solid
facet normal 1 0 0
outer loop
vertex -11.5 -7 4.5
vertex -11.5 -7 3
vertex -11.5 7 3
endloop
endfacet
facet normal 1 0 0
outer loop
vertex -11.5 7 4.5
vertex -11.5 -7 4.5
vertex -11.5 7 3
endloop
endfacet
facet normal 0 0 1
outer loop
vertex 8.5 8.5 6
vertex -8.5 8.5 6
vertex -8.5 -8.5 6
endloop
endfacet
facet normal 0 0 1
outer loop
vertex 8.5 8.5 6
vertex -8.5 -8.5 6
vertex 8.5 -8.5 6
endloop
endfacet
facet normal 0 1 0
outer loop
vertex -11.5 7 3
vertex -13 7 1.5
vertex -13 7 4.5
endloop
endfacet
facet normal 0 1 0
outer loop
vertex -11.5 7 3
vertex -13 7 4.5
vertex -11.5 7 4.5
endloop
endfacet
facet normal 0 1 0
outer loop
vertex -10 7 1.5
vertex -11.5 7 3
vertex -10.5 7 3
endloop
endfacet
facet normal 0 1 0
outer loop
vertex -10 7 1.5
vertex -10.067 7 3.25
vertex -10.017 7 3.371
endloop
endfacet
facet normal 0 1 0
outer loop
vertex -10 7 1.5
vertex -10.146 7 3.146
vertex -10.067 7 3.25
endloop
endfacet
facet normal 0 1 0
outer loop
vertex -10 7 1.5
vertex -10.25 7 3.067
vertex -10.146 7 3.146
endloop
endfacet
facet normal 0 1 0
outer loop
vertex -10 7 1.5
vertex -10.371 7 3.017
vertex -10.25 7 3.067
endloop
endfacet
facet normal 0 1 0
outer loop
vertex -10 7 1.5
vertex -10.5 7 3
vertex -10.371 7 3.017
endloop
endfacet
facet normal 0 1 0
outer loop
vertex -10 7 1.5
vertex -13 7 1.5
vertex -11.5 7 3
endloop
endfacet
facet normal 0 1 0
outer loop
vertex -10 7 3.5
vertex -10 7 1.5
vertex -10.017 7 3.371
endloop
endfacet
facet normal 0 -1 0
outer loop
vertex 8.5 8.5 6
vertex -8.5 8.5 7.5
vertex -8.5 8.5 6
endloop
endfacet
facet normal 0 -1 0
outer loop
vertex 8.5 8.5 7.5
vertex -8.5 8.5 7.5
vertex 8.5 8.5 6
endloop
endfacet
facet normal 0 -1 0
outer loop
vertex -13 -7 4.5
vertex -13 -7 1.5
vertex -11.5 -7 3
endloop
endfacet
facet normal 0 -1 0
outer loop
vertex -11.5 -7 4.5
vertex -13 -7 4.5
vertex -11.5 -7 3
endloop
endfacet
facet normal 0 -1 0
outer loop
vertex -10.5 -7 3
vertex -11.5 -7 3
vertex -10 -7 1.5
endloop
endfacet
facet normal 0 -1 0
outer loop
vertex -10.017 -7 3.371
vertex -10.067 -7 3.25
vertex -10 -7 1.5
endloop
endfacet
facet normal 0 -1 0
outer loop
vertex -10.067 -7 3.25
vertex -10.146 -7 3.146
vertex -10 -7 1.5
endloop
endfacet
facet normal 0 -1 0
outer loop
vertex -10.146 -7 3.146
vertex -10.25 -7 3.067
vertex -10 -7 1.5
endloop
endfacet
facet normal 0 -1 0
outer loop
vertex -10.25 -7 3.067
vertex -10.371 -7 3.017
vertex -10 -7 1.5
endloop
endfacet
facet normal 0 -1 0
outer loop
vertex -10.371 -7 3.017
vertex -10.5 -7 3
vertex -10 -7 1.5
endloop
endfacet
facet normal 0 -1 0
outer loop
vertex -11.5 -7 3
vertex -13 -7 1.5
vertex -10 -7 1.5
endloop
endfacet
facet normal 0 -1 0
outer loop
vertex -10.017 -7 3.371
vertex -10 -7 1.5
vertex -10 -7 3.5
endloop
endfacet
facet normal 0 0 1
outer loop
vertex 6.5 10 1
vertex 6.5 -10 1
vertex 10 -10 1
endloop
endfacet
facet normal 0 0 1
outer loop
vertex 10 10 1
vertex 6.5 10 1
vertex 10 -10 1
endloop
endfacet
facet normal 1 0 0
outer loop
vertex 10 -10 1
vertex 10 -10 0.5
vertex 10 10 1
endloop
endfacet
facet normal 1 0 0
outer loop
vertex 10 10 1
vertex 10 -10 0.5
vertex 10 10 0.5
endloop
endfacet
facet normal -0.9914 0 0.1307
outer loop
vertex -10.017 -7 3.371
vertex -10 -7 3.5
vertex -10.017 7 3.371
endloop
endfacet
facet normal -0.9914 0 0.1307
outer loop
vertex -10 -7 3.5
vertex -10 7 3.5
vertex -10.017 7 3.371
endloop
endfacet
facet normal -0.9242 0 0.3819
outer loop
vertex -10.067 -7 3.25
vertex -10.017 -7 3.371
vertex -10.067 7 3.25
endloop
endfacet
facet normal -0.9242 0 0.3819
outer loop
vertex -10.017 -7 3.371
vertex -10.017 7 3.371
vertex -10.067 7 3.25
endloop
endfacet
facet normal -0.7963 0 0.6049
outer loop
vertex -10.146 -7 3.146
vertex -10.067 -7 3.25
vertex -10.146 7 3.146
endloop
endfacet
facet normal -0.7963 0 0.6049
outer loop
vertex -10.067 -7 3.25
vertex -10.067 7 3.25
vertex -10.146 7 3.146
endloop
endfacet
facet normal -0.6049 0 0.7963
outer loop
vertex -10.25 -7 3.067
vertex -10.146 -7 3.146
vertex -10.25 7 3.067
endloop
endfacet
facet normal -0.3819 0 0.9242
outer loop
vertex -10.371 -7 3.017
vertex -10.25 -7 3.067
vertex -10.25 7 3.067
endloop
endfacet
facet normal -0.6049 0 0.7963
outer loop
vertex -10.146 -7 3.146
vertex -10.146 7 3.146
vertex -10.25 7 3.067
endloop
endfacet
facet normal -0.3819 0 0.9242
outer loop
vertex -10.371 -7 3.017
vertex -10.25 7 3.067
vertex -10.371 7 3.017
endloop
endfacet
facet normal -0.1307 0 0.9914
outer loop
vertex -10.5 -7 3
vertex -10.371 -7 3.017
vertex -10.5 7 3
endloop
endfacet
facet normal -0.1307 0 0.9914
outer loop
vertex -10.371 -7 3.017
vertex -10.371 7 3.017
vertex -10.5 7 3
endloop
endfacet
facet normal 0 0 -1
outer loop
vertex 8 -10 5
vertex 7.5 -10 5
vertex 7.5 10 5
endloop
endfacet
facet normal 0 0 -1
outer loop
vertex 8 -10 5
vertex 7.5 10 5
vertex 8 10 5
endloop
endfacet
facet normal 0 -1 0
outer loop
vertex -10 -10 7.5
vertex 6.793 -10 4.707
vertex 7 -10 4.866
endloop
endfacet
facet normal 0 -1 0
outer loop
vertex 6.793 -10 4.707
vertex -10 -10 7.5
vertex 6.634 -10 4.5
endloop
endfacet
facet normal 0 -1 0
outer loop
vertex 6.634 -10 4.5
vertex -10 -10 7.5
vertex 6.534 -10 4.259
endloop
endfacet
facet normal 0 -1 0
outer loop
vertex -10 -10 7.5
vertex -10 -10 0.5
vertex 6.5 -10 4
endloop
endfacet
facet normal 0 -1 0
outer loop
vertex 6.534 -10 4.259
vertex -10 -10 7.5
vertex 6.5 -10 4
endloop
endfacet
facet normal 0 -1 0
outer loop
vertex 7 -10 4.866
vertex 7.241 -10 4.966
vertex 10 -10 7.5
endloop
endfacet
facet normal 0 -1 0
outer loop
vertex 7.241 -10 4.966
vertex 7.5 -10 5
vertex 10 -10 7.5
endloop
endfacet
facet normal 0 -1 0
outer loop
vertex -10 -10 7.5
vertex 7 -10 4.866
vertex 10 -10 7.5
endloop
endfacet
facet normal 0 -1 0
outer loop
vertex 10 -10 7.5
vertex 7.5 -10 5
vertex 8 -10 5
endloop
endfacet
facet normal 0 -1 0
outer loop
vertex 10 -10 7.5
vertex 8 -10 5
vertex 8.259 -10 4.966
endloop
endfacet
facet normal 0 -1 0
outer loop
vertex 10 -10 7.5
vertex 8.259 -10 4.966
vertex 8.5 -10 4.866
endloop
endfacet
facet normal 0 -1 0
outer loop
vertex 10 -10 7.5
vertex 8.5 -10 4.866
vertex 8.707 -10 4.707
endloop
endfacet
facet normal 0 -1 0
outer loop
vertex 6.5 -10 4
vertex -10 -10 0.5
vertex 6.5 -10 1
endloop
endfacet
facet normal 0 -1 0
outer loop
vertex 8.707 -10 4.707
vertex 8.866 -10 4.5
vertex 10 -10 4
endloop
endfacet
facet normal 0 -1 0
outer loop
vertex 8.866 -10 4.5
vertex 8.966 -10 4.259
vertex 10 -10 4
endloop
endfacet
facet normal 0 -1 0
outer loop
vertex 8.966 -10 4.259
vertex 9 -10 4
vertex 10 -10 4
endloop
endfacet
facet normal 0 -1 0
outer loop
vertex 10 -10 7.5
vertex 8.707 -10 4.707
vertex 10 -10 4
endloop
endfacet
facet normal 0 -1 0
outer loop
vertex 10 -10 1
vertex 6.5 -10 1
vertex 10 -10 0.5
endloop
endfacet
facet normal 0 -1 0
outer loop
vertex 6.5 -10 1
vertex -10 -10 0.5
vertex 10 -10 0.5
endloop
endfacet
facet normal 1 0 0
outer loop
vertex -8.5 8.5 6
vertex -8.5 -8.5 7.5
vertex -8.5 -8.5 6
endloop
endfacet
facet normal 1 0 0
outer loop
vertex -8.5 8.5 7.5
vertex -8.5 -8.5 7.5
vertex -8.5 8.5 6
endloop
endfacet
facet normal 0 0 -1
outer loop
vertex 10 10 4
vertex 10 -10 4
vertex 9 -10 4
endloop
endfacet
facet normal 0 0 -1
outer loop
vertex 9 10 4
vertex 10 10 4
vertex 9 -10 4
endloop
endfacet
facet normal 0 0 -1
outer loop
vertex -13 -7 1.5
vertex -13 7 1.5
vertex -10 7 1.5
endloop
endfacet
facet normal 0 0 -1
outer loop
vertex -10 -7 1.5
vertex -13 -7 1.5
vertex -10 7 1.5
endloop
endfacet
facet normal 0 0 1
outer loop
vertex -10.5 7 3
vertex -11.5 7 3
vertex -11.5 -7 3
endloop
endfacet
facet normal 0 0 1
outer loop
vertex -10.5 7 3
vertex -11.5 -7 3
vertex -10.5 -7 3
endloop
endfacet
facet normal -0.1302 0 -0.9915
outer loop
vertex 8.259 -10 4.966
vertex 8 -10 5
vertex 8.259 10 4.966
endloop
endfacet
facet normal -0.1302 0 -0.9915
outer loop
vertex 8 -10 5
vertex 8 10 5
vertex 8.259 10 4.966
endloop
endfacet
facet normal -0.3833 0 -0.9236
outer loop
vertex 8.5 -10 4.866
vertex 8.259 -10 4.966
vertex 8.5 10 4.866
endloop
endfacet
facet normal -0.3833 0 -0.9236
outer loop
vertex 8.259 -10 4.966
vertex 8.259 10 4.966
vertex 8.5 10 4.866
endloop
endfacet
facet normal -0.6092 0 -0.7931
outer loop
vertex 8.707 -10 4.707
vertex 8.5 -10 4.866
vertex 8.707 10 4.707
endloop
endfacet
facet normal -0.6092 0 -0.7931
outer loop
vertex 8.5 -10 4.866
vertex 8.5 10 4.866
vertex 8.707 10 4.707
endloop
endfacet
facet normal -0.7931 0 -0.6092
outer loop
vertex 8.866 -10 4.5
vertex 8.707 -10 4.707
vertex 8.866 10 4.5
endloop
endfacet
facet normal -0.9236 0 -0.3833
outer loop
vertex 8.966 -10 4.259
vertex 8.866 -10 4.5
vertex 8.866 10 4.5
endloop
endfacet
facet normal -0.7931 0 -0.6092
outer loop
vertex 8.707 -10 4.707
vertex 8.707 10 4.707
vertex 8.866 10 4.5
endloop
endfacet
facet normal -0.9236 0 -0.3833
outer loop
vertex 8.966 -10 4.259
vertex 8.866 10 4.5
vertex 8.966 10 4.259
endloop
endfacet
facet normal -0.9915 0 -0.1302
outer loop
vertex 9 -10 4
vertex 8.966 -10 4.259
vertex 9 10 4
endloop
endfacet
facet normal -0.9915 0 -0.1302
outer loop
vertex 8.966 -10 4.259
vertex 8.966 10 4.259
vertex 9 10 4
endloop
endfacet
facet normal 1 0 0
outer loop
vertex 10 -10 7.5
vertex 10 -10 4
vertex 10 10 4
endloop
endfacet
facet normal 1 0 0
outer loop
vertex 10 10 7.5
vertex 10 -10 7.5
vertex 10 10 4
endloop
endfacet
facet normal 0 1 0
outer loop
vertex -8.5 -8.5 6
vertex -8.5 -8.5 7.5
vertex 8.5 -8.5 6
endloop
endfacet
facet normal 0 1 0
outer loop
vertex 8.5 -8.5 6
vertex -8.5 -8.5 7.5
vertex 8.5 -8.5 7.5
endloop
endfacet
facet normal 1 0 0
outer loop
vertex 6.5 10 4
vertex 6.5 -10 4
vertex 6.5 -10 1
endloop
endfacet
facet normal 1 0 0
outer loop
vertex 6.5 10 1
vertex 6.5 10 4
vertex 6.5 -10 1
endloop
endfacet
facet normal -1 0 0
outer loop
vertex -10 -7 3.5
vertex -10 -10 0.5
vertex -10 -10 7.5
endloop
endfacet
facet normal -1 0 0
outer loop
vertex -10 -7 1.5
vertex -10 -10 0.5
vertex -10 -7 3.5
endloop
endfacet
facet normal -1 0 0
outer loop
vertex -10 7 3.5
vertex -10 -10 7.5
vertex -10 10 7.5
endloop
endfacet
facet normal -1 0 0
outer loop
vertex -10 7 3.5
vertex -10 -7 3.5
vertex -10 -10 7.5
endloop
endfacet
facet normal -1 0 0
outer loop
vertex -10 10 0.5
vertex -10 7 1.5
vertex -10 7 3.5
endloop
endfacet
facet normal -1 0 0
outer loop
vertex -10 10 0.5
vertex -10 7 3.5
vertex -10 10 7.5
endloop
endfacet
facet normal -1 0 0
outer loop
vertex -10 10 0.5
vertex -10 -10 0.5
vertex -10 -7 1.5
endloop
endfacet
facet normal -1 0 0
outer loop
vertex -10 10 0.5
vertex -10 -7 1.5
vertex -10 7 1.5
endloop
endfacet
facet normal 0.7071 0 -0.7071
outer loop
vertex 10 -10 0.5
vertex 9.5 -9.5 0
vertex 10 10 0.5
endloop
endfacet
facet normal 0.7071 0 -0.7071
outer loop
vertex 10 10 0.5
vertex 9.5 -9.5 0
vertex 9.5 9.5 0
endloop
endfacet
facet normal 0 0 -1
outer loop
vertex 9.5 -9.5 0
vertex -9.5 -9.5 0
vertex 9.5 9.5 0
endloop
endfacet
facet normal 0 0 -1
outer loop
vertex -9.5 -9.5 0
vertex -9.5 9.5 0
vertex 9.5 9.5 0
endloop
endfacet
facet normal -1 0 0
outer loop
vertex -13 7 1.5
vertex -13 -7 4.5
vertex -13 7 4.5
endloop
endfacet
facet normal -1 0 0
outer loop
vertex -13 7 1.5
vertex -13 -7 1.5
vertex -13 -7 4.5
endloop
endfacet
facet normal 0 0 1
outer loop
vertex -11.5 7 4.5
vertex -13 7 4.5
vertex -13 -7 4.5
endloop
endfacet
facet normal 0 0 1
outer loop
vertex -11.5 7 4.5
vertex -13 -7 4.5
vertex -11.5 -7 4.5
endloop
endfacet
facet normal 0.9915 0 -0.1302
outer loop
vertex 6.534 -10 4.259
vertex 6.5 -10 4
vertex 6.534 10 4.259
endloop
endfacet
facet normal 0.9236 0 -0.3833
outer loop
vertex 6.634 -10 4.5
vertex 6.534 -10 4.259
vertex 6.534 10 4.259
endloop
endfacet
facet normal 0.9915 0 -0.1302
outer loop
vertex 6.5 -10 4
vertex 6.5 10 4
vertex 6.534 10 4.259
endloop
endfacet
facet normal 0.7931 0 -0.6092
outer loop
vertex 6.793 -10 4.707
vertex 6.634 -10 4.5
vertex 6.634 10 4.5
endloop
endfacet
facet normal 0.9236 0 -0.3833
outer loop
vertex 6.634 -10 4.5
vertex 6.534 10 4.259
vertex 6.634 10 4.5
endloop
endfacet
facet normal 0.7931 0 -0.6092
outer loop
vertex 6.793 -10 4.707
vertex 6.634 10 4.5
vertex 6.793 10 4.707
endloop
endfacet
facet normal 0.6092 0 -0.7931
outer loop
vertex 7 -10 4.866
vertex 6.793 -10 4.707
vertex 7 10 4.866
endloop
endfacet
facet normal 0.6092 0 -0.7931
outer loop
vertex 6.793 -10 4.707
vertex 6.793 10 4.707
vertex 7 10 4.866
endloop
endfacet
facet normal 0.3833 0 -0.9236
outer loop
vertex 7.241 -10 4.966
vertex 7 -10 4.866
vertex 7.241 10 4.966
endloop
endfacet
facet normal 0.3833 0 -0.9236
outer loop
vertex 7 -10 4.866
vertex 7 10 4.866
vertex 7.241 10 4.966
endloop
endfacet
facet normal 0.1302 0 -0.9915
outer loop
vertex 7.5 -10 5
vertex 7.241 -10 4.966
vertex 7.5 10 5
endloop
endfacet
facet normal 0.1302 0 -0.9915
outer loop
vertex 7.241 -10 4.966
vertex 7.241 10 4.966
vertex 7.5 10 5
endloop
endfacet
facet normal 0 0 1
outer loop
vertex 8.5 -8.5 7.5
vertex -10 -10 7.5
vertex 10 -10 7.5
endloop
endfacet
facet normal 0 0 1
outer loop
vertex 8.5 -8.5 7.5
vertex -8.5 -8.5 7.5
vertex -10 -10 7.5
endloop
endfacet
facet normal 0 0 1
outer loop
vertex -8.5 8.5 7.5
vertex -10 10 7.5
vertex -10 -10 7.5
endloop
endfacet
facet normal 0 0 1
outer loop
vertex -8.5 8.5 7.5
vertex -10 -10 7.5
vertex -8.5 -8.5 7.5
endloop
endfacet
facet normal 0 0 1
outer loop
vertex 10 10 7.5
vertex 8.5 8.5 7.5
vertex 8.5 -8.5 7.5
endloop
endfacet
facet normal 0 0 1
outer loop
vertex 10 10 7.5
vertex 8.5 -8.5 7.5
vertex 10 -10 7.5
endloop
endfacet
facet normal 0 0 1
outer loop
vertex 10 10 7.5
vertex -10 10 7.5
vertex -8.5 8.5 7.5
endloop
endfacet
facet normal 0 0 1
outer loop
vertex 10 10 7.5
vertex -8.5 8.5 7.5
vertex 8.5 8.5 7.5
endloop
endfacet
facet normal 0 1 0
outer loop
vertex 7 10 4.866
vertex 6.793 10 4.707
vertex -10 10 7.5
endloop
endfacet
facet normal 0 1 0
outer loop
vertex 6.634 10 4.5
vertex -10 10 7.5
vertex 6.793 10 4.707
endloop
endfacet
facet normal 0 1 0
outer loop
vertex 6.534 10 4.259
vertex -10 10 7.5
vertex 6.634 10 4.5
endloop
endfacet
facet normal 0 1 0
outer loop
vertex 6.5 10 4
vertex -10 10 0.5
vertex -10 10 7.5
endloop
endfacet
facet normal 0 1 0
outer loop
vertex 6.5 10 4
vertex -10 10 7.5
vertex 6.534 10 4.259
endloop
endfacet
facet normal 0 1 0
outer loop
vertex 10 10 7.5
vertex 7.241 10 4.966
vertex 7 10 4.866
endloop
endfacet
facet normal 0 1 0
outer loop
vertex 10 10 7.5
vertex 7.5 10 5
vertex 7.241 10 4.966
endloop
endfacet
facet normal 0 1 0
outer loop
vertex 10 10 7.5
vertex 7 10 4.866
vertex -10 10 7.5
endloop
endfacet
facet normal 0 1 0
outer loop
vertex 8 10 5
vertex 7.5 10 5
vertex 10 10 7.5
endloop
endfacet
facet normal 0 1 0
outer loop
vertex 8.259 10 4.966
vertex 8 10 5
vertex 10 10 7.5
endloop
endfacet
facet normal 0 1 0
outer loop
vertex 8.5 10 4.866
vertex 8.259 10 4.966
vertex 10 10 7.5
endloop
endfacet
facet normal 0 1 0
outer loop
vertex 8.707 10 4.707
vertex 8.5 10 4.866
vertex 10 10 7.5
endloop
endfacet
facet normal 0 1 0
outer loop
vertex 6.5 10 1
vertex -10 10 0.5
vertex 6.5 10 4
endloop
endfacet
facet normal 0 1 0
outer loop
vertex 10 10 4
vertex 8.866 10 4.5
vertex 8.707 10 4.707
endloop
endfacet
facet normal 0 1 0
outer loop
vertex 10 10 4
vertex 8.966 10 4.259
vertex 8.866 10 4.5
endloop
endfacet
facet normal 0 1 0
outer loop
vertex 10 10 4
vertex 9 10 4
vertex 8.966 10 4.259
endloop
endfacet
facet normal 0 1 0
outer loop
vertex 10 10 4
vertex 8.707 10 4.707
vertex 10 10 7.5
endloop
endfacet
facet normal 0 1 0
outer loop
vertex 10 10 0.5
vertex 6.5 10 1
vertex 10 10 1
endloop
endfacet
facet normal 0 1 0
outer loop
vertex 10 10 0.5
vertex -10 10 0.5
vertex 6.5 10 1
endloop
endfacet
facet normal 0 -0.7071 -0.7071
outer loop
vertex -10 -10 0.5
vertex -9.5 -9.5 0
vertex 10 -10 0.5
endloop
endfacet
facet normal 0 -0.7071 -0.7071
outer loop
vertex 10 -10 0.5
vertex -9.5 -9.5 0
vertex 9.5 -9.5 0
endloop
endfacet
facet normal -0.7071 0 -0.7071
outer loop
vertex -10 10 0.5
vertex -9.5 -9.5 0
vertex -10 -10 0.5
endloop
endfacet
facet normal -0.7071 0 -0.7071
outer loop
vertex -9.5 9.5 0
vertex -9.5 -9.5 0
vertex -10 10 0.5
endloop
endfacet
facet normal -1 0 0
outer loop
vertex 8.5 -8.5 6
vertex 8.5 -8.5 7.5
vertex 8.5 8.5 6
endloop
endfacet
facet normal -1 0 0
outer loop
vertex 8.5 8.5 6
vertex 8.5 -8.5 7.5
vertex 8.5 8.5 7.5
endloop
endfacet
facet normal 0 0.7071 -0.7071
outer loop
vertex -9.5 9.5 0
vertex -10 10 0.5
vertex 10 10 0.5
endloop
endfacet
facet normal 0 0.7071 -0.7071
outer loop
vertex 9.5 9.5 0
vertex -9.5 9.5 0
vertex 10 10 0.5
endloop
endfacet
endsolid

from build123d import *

# Parameters (mm, degrees)
F0_W      = 20
F0_H      = 20
F1_DEPTH  = 1.5
F2_W      = 3
F2_H      = 14
F3_DEPTH  = 1.5
F4_W      = 1.5
F4_H      = 14
F5_DEPTH  = 1.5
F6_DEPTH  = 6
F7_W      = 17
F7_H      = 17
F8_DEPTH  = 1.5
F9_W      = 2.5
F9_H      = 1
F10_DEPTH = 20
F11_R     = 0.99999
F12_R     = 0.5
F13_SIZE  = 0.5


# Not quite as in the source:
# - a fillet or chamfer is up to 0.001 mm smaller than in the source, because OpenCascade refuses the exact size


with BuildPart() as f1:
    # F0 (on Top) → F1 (new body)
    with BuildSketch(Plane.XY):
        Rectangle(F0_W, F0_H)
    extrude(amount=F1_DEPTH)

    # F6 (add): a face of the model
    f6_faces = [f1.faces().sort_by_distance(p)[0] for p in [
        (0, 0, 1.5),
    ]]


with BuildPart() as f3:
    # F2 (on face) → F3 (new body)
    with BuildSketch(Plane.XY.offset(1.5)):
        with Locations((-11.5, 0)):
            Rectangle(F2_W, F2_H)
    extrude(amount=F3_DEPTH)

    # F4 (on face) → F5 (join)
    with BuildSketch(Plane.XY.offset(3)):
        with Locations((-12.25, 0)):
            Rectangle(F4_W, F4_H)
    extrude(amount=F5_DEPTH)


with BuildPart() as f1_1:
    add(f1.part)

    add(f3.part)  # F6 merges F3
    extrude(f6_faces, amount=F6_DEPTH)

    # F7 (on face) → F8 (cut)
    with BuildSketch(Plane.XY.offset(7.5)):
        Rectangle(F7_W, F7_H)
    extrude(amount=-F8_DEPTH, mode=Mode.SUBTRACT)

    # F9 (on face) → F10 (cut, through all)
    with BuildSketch(Plane.XZ.offset(10)):
        Polygon((6.5, 1), (10, 1), (10, 4), (9, 4), (6.5, 4), align=None)
        with Locations((7.75, 4.5)):
            Rectangle(F9_W, F9_H)
    extrude(amount=-F10_DEPTH, mode=Mode.SUBTRACT)

    # F11 (radius 1 in the source; OpenCascade refuses exactly that, so slightly less here)
    f11_edges = [f1_1.edges().sort_by_distance(p)[0] for p in [
        (6.5, 0, 5),
        (9, 0, 5),
    ]]
    fillet(f11_edges, radius=F11_R)

    # F12
    f12_edges = [f1_1.edges().sort_by_distance(p)[0] for p in [
        (-10, 0, 3),
    ]]
    fillet(f12_edges, radius=F12_R)

    # F13
    f13_edges = [f1_1.edges().sort_by_distance(p)[0] for p in [
        (0, -10, 0),
        (10, 0, 0),
        (0, 10, 0),
        (-10, 0, 0),
    ]]
    chamfer(f13_edges, length=F13_SIZE)


solid = f1_1.part
